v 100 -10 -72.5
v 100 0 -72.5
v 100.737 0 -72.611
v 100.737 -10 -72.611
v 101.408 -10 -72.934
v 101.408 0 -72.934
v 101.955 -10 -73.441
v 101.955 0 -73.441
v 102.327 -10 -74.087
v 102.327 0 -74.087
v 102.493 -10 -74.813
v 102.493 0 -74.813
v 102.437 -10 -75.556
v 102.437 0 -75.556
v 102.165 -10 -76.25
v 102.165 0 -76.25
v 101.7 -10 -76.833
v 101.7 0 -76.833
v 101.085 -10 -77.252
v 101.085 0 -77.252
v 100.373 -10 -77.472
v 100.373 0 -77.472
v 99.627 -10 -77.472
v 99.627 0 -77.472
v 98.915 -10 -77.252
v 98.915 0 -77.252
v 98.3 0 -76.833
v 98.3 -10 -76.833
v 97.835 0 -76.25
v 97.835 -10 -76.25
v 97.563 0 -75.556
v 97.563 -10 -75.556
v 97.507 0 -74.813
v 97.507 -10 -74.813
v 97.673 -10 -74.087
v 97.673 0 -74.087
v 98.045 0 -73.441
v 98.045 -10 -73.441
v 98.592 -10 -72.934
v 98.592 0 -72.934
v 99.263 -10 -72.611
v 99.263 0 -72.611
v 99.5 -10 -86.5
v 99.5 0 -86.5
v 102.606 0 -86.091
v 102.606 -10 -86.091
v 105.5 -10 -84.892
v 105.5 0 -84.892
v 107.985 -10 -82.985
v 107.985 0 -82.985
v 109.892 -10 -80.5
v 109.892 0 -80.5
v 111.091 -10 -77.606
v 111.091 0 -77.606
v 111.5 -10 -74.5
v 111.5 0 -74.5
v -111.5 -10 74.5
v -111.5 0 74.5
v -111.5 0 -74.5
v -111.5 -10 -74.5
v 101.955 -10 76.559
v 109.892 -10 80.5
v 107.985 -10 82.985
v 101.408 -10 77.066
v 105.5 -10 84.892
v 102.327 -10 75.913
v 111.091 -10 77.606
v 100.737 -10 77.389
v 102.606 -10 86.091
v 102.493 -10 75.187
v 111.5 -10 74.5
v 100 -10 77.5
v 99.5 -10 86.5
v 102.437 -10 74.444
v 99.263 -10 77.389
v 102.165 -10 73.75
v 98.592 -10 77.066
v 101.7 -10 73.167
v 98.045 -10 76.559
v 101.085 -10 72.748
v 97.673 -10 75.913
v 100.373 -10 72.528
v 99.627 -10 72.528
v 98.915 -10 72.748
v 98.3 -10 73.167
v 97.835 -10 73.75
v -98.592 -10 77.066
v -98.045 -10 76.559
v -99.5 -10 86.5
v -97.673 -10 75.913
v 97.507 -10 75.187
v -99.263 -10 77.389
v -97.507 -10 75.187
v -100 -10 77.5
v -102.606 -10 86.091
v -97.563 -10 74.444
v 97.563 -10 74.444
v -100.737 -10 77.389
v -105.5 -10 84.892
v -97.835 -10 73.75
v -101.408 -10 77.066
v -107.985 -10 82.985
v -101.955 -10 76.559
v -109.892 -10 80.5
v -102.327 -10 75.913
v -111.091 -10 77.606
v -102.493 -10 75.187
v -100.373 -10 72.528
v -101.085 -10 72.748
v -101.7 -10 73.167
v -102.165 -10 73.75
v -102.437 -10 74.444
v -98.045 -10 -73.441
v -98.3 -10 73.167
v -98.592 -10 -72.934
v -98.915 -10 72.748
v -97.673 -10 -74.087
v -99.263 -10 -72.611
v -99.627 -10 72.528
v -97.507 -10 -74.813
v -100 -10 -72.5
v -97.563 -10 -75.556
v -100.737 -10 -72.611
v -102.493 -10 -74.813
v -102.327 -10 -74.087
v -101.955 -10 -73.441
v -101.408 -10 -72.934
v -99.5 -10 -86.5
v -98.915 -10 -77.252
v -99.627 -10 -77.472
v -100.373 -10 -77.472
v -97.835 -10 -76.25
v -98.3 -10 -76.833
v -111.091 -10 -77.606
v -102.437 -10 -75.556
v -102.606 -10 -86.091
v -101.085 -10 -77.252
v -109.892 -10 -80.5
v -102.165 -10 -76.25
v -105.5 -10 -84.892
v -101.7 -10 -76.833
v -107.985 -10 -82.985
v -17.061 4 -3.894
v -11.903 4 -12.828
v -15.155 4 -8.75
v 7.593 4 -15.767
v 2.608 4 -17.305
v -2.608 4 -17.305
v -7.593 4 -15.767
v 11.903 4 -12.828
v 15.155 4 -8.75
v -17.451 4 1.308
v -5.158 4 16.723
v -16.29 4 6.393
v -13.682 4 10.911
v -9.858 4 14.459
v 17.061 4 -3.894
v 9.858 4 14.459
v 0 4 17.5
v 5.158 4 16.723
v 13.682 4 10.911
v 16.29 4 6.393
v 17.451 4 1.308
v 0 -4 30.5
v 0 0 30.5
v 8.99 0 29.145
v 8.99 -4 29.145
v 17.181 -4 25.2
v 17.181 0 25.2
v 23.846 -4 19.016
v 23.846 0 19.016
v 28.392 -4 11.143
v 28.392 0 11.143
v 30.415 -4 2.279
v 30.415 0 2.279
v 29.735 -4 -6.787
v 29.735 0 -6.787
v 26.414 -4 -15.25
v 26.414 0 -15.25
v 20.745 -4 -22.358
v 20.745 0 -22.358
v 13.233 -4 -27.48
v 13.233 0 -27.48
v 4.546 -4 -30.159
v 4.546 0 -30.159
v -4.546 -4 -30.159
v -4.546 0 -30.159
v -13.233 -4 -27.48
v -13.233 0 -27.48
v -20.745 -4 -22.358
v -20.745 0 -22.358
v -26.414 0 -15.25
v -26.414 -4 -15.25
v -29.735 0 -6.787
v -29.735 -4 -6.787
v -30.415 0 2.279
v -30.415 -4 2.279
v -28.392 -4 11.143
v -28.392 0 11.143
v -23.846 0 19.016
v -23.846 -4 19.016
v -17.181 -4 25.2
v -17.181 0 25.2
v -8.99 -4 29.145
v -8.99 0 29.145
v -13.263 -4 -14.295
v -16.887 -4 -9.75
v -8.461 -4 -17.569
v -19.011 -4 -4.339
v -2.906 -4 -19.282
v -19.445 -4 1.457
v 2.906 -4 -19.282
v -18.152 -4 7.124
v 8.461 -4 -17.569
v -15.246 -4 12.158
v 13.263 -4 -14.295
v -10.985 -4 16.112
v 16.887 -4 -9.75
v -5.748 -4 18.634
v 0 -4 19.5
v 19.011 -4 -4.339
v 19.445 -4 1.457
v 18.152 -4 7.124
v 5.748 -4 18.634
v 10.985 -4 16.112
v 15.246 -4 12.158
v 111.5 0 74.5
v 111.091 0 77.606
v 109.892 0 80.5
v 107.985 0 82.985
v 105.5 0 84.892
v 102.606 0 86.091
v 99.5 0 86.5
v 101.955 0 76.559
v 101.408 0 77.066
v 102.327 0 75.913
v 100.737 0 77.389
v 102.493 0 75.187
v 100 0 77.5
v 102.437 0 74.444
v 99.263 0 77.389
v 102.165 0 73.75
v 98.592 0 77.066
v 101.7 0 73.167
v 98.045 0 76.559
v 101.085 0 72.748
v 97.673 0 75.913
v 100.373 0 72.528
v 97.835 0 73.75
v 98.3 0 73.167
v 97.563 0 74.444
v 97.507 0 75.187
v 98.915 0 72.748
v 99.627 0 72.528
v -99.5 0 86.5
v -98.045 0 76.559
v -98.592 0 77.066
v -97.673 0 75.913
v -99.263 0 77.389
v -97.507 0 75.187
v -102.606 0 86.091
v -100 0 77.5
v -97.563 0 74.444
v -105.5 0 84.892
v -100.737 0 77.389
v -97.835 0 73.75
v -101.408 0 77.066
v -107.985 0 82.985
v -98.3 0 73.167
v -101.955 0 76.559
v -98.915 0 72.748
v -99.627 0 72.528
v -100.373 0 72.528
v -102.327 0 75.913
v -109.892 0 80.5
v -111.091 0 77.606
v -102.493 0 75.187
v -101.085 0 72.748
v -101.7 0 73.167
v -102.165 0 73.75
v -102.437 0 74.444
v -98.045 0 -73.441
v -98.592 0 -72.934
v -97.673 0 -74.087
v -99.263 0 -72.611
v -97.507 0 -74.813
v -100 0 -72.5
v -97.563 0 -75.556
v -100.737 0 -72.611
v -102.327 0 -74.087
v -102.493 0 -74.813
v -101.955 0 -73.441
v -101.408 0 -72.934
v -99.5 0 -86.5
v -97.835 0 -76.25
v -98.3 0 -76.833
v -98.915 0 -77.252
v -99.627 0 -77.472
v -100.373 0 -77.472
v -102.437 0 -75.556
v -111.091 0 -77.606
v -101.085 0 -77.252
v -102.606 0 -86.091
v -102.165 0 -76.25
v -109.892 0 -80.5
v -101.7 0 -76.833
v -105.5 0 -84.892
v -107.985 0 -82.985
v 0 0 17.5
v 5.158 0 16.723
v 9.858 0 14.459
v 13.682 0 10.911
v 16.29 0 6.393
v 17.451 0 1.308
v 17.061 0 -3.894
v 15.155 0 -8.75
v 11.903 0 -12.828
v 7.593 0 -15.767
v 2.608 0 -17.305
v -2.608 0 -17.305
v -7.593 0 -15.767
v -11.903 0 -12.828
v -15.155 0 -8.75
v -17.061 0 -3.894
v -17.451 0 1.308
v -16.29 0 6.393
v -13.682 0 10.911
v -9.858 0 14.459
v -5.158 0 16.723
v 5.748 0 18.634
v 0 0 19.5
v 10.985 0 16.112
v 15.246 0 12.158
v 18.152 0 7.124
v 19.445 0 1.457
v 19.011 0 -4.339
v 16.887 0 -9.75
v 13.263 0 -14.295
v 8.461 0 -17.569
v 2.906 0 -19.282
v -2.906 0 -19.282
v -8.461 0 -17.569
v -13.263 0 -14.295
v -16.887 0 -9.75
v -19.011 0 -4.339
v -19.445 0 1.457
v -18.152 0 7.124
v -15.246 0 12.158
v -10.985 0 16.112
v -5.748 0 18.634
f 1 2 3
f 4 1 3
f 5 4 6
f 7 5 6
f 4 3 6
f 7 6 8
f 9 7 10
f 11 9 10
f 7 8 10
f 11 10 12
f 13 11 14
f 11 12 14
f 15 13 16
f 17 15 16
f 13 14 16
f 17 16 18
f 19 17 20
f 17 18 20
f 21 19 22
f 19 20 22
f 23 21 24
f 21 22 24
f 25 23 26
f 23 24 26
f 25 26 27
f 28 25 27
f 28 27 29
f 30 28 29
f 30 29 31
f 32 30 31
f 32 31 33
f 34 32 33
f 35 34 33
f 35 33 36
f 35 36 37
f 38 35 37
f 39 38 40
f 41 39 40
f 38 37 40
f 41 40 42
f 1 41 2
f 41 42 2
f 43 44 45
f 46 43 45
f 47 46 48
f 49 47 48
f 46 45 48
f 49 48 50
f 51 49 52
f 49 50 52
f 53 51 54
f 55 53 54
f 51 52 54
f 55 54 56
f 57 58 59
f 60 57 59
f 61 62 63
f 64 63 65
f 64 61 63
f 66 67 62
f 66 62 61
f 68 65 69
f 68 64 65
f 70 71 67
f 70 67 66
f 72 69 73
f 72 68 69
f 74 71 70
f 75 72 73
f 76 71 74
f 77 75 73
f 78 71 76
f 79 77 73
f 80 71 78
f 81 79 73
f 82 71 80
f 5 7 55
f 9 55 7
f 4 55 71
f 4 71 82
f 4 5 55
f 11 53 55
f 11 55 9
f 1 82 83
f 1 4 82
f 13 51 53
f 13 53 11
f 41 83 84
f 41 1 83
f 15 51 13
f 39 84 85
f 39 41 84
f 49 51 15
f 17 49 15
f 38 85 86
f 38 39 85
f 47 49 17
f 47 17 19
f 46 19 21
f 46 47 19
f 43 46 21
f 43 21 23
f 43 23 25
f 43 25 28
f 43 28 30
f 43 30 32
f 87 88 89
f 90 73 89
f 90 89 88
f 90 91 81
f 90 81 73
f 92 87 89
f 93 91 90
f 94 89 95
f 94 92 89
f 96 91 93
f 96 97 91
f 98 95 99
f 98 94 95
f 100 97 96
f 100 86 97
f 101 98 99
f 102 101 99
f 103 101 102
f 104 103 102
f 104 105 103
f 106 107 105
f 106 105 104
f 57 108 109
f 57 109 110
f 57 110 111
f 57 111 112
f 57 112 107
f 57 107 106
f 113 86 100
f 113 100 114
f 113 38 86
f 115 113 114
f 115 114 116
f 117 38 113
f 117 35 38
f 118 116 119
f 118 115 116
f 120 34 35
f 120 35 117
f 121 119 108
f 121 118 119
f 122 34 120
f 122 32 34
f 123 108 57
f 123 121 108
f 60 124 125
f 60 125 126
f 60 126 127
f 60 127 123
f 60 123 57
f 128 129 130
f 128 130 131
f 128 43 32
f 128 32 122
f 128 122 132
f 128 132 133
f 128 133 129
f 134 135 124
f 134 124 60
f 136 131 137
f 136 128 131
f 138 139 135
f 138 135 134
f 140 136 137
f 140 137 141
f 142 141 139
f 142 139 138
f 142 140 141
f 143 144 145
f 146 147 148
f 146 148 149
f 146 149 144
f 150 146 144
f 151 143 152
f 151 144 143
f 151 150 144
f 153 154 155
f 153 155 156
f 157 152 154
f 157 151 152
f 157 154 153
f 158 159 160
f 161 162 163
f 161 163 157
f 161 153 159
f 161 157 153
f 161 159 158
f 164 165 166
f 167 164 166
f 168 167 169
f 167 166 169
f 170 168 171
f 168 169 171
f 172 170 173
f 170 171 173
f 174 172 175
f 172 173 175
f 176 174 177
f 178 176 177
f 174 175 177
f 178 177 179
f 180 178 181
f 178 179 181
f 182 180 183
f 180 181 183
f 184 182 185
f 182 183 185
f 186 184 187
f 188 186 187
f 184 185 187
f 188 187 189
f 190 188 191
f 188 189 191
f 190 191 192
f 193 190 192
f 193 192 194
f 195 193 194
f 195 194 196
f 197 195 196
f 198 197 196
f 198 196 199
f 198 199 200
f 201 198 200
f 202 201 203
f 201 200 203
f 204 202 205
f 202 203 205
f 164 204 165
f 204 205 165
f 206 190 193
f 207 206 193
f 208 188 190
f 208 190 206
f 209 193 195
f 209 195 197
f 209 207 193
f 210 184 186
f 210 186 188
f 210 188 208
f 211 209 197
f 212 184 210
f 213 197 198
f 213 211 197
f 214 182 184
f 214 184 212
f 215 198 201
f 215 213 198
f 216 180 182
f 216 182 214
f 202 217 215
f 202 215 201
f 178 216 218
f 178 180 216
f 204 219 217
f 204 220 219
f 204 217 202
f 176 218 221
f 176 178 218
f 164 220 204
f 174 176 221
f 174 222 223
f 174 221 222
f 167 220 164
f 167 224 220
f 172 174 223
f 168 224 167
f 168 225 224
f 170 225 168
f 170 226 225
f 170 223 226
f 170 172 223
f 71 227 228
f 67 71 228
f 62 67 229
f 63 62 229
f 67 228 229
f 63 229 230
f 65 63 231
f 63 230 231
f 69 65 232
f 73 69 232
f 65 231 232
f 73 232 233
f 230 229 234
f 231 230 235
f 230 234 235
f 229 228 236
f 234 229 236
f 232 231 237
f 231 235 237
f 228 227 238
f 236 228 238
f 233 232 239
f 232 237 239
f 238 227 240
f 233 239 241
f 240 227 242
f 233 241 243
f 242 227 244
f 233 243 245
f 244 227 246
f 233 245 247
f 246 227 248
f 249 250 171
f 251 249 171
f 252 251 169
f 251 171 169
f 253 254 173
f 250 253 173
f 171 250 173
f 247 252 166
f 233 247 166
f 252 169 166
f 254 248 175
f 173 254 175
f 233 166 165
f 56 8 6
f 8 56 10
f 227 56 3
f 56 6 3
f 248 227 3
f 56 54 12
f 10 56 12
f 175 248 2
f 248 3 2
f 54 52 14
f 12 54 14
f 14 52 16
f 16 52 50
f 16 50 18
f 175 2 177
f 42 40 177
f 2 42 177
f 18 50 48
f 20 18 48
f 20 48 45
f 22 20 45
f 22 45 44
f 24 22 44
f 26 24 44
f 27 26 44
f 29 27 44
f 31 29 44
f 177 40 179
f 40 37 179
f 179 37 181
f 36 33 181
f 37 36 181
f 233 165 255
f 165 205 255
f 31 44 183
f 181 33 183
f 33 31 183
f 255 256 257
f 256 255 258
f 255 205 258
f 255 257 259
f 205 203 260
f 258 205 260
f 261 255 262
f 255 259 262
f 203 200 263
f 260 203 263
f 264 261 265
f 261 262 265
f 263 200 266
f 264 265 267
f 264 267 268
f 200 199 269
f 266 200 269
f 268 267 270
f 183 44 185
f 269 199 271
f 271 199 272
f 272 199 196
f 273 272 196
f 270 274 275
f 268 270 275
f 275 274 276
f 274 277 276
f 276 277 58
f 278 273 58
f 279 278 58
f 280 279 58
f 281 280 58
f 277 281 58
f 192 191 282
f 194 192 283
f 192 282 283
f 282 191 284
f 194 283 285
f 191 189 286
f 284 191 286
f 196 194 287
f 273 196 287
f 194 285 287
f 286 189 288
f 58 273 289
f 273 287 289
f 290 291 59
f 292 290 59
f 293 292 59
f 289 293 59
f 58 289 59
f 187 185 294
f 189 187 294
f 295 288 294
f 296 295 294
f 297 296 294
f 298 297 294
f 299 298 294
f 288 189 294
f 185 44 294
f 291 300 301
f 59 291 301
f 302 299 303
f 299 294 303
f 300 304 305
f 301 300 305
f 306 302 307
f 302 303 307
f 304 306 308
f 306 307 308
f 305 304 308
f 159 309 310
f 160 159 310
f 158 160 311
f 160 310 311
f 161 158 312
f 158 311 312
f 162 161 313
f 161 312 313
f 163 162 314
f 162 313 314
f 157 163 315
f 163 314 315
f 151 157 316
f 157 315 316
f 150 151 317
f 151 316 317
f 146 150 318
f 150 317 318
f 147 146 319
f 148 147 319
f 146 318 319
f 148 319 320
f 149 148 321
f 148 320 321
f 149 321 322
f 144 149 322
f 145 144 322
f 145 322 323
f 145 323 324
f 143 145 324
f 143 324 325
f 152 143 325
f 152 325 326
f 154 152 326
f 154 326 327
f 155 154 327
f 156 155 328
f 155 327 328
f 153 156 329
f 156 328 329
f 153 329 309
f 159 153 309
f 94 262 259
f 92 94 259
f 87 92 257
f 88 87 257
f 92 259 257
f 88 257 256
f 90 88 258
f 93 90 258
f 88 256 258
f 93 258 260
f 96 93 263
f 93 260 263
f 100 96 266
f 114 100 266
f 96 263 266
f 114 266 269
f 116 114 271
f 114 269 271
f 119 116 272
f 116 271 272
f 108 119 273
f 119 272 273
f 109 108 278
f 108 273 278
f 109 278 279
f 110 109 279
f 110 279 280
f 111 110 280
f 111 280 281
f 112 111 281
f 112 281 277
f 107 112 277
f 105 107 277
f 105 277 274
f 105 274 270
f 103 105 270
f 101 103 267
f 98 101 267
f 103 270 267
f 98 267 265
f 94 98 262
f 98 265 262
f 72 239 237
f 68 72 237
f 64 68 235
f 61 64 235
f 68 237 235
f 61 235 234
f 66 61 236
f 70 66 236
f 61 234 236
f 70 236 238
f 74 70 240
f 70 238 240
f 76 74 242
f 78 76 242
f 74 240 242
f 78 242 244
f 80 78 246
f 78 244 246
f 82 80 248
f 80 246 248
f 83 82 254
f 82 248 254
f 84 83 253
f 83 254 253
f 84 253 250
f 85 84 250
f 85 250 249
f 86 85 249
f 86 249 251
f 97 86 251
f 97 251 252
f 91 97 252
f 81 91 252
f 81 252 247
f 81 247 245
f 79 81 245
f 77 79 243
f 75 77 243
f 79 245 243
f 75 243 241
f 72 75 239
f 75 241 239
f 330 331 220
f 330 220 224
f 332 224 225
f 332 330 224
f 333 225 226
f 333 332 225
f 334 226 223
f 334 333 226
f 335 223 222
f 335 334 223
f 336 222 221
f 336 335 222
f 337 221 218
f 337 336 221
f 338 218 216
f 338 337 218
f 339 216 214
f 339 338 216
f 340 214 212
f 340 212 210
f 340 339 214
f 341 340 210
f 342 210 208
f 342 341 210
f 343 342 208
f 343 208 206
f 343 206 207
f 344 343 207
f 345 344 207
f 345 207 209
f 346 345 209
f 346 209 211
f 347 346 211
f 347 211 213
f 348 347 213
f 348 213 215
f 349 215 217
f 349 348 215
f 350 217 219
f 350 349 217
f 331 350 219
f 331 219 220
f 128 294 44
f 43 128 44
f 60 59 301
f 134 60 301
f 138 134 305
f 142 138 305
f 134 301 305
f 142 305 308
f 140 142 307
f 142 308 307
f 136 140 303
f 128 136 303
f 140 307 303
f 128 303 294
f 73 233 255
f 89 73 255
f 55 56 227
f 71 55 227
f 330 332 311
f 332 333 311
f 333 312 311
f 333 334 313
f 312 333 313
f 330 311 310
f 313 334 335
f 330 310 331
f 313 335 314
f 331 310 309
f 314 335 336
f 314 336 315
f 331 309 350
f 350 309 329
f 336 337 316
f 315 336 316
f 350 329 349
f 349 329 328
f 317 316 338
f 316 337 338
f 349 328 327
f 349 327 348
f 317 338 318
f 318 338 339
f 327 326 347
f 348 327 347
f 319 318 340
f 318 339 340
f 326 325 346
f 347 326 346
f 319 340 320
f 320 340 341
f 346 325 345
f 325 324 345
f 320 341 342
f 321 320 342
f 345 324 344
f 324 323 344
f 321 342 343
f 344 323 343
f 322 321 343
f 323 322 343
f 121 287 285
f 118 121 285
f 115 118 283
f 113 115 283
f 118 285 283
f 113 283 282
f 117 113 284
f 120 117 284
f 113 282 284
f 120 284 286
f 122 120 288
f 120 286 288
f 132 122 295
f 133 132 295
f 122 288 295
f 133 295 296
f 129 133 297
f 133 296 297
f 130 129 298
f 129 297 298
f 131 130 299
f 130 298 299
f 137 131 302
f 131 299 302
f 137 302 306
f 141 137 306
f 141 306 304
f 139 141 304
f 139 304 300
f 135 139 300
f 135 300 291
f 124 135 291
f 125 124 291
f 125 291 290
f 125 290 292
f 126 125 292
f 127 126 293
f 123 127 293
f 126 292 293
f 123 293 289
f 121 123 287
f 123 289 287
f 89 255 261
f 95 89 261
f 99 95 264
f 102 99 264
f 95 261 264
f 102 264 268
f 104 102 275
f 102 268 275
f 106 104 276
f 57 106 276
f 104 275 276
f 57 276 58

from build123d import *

# Parameters (mm, degrees)
SKETCH1_R           = 2.5
BOSS_EXTRUDE1_DEPTH = 10
SKETCH2_R           = 30.5
SKETCH2_R_2         = 19.5
CUT_EXTRUDE1_DEPTH  = 4
SKETCH3_R           = 17.5
BOSS_EXTRUDE2_DEPTH = 4


with BuildPart() as part:
    # Sketch1 → Boss-Extrude1 (new body)
    with BuildSketch(Plane(origin=(0, 0, 0), x_dir=(1, 0, 0), z_dir=(0, 1, 0))):
        with BuildLine():
            Line((-99.5, 86.5), (99.5, 86.5))
            ThreePointArc((99.5, 86.5), (107.985281374, 82.985281374), (111.5, 74.5))
            Line((111.5, 74.5), (111.5, -74.5))
            ThreePointArc((111.5, -74.5), (107.985281374, -82.985281374), (99.5, -86.5))
            Line((99.5, -86.5), (-99.5, -86.5))
            ThreePointArc((-99.5, -86.5), (-107.985281374, -82.985281374), (-111.5, -74.5))
            Line((-111.5, -74.5), (-111.5, 74.5))
            ThreePointArc((-111.5, 74.5), (-107.985281374, 82.985281374), (-99.5, 86.5))
        make_face()
        with Locations(Location((100, 75, 0), (0, 0, 270))):
            Circle(SKETCH1_R, mode=Mode.SUBTRACT)
        with Locations(Location((100, -75, 0), (0, 0, 270))):
            Circle(SKETCH1_R, mode=Mode.SUBTRACT)
        with Locations(Location((-100, -75, 0), (0, 0, 270))):
            Circle(SKETCH1_R, mode=Mode.SUBTRACT)
        with Locations(Location((-100, 75, 0), (0, 0, 270))):
            Circle(SKETCH1_R, mode=Mode.SUBTRACT)
    extrude(amount=-BOSS_EXTRUDE1_DEPTH)

    # Sketch2 → Cut-Extrude1 (cut)
    with BuildSketch(Plane(origin=(0, 0, 0), x_dir=(1, 0, 0), z_dir=(0, 1, 0))):
        with Locations(Location((0, 0, 0), (0, 0, 270))):
            Circle(SKETCH2_R)
        with Locations(Location((0, 0, 0), (0, 0, 270))):
            Circle(SKETCH2_R_2, mode=Mode.SUBTRACT)
    extrude(amount=-CUT_EXTRUDE1_DEPTH, mode=Mode.SUBTRACT)

    # Sketch3 → Boss-Extrude2 (add)
    with BuildSketch(Plane(origin=(0, 0, 0), x_dir=(1, 0, 0), z_dir=(0, 1, 0))):
        with Locations(Location((0, 0, 0), (0, 0, 270))):
            Circle(SKETCH3_R)
    extrude(amount=BOSS_EXTRUDE2_DEPTH)


solid = part.part
